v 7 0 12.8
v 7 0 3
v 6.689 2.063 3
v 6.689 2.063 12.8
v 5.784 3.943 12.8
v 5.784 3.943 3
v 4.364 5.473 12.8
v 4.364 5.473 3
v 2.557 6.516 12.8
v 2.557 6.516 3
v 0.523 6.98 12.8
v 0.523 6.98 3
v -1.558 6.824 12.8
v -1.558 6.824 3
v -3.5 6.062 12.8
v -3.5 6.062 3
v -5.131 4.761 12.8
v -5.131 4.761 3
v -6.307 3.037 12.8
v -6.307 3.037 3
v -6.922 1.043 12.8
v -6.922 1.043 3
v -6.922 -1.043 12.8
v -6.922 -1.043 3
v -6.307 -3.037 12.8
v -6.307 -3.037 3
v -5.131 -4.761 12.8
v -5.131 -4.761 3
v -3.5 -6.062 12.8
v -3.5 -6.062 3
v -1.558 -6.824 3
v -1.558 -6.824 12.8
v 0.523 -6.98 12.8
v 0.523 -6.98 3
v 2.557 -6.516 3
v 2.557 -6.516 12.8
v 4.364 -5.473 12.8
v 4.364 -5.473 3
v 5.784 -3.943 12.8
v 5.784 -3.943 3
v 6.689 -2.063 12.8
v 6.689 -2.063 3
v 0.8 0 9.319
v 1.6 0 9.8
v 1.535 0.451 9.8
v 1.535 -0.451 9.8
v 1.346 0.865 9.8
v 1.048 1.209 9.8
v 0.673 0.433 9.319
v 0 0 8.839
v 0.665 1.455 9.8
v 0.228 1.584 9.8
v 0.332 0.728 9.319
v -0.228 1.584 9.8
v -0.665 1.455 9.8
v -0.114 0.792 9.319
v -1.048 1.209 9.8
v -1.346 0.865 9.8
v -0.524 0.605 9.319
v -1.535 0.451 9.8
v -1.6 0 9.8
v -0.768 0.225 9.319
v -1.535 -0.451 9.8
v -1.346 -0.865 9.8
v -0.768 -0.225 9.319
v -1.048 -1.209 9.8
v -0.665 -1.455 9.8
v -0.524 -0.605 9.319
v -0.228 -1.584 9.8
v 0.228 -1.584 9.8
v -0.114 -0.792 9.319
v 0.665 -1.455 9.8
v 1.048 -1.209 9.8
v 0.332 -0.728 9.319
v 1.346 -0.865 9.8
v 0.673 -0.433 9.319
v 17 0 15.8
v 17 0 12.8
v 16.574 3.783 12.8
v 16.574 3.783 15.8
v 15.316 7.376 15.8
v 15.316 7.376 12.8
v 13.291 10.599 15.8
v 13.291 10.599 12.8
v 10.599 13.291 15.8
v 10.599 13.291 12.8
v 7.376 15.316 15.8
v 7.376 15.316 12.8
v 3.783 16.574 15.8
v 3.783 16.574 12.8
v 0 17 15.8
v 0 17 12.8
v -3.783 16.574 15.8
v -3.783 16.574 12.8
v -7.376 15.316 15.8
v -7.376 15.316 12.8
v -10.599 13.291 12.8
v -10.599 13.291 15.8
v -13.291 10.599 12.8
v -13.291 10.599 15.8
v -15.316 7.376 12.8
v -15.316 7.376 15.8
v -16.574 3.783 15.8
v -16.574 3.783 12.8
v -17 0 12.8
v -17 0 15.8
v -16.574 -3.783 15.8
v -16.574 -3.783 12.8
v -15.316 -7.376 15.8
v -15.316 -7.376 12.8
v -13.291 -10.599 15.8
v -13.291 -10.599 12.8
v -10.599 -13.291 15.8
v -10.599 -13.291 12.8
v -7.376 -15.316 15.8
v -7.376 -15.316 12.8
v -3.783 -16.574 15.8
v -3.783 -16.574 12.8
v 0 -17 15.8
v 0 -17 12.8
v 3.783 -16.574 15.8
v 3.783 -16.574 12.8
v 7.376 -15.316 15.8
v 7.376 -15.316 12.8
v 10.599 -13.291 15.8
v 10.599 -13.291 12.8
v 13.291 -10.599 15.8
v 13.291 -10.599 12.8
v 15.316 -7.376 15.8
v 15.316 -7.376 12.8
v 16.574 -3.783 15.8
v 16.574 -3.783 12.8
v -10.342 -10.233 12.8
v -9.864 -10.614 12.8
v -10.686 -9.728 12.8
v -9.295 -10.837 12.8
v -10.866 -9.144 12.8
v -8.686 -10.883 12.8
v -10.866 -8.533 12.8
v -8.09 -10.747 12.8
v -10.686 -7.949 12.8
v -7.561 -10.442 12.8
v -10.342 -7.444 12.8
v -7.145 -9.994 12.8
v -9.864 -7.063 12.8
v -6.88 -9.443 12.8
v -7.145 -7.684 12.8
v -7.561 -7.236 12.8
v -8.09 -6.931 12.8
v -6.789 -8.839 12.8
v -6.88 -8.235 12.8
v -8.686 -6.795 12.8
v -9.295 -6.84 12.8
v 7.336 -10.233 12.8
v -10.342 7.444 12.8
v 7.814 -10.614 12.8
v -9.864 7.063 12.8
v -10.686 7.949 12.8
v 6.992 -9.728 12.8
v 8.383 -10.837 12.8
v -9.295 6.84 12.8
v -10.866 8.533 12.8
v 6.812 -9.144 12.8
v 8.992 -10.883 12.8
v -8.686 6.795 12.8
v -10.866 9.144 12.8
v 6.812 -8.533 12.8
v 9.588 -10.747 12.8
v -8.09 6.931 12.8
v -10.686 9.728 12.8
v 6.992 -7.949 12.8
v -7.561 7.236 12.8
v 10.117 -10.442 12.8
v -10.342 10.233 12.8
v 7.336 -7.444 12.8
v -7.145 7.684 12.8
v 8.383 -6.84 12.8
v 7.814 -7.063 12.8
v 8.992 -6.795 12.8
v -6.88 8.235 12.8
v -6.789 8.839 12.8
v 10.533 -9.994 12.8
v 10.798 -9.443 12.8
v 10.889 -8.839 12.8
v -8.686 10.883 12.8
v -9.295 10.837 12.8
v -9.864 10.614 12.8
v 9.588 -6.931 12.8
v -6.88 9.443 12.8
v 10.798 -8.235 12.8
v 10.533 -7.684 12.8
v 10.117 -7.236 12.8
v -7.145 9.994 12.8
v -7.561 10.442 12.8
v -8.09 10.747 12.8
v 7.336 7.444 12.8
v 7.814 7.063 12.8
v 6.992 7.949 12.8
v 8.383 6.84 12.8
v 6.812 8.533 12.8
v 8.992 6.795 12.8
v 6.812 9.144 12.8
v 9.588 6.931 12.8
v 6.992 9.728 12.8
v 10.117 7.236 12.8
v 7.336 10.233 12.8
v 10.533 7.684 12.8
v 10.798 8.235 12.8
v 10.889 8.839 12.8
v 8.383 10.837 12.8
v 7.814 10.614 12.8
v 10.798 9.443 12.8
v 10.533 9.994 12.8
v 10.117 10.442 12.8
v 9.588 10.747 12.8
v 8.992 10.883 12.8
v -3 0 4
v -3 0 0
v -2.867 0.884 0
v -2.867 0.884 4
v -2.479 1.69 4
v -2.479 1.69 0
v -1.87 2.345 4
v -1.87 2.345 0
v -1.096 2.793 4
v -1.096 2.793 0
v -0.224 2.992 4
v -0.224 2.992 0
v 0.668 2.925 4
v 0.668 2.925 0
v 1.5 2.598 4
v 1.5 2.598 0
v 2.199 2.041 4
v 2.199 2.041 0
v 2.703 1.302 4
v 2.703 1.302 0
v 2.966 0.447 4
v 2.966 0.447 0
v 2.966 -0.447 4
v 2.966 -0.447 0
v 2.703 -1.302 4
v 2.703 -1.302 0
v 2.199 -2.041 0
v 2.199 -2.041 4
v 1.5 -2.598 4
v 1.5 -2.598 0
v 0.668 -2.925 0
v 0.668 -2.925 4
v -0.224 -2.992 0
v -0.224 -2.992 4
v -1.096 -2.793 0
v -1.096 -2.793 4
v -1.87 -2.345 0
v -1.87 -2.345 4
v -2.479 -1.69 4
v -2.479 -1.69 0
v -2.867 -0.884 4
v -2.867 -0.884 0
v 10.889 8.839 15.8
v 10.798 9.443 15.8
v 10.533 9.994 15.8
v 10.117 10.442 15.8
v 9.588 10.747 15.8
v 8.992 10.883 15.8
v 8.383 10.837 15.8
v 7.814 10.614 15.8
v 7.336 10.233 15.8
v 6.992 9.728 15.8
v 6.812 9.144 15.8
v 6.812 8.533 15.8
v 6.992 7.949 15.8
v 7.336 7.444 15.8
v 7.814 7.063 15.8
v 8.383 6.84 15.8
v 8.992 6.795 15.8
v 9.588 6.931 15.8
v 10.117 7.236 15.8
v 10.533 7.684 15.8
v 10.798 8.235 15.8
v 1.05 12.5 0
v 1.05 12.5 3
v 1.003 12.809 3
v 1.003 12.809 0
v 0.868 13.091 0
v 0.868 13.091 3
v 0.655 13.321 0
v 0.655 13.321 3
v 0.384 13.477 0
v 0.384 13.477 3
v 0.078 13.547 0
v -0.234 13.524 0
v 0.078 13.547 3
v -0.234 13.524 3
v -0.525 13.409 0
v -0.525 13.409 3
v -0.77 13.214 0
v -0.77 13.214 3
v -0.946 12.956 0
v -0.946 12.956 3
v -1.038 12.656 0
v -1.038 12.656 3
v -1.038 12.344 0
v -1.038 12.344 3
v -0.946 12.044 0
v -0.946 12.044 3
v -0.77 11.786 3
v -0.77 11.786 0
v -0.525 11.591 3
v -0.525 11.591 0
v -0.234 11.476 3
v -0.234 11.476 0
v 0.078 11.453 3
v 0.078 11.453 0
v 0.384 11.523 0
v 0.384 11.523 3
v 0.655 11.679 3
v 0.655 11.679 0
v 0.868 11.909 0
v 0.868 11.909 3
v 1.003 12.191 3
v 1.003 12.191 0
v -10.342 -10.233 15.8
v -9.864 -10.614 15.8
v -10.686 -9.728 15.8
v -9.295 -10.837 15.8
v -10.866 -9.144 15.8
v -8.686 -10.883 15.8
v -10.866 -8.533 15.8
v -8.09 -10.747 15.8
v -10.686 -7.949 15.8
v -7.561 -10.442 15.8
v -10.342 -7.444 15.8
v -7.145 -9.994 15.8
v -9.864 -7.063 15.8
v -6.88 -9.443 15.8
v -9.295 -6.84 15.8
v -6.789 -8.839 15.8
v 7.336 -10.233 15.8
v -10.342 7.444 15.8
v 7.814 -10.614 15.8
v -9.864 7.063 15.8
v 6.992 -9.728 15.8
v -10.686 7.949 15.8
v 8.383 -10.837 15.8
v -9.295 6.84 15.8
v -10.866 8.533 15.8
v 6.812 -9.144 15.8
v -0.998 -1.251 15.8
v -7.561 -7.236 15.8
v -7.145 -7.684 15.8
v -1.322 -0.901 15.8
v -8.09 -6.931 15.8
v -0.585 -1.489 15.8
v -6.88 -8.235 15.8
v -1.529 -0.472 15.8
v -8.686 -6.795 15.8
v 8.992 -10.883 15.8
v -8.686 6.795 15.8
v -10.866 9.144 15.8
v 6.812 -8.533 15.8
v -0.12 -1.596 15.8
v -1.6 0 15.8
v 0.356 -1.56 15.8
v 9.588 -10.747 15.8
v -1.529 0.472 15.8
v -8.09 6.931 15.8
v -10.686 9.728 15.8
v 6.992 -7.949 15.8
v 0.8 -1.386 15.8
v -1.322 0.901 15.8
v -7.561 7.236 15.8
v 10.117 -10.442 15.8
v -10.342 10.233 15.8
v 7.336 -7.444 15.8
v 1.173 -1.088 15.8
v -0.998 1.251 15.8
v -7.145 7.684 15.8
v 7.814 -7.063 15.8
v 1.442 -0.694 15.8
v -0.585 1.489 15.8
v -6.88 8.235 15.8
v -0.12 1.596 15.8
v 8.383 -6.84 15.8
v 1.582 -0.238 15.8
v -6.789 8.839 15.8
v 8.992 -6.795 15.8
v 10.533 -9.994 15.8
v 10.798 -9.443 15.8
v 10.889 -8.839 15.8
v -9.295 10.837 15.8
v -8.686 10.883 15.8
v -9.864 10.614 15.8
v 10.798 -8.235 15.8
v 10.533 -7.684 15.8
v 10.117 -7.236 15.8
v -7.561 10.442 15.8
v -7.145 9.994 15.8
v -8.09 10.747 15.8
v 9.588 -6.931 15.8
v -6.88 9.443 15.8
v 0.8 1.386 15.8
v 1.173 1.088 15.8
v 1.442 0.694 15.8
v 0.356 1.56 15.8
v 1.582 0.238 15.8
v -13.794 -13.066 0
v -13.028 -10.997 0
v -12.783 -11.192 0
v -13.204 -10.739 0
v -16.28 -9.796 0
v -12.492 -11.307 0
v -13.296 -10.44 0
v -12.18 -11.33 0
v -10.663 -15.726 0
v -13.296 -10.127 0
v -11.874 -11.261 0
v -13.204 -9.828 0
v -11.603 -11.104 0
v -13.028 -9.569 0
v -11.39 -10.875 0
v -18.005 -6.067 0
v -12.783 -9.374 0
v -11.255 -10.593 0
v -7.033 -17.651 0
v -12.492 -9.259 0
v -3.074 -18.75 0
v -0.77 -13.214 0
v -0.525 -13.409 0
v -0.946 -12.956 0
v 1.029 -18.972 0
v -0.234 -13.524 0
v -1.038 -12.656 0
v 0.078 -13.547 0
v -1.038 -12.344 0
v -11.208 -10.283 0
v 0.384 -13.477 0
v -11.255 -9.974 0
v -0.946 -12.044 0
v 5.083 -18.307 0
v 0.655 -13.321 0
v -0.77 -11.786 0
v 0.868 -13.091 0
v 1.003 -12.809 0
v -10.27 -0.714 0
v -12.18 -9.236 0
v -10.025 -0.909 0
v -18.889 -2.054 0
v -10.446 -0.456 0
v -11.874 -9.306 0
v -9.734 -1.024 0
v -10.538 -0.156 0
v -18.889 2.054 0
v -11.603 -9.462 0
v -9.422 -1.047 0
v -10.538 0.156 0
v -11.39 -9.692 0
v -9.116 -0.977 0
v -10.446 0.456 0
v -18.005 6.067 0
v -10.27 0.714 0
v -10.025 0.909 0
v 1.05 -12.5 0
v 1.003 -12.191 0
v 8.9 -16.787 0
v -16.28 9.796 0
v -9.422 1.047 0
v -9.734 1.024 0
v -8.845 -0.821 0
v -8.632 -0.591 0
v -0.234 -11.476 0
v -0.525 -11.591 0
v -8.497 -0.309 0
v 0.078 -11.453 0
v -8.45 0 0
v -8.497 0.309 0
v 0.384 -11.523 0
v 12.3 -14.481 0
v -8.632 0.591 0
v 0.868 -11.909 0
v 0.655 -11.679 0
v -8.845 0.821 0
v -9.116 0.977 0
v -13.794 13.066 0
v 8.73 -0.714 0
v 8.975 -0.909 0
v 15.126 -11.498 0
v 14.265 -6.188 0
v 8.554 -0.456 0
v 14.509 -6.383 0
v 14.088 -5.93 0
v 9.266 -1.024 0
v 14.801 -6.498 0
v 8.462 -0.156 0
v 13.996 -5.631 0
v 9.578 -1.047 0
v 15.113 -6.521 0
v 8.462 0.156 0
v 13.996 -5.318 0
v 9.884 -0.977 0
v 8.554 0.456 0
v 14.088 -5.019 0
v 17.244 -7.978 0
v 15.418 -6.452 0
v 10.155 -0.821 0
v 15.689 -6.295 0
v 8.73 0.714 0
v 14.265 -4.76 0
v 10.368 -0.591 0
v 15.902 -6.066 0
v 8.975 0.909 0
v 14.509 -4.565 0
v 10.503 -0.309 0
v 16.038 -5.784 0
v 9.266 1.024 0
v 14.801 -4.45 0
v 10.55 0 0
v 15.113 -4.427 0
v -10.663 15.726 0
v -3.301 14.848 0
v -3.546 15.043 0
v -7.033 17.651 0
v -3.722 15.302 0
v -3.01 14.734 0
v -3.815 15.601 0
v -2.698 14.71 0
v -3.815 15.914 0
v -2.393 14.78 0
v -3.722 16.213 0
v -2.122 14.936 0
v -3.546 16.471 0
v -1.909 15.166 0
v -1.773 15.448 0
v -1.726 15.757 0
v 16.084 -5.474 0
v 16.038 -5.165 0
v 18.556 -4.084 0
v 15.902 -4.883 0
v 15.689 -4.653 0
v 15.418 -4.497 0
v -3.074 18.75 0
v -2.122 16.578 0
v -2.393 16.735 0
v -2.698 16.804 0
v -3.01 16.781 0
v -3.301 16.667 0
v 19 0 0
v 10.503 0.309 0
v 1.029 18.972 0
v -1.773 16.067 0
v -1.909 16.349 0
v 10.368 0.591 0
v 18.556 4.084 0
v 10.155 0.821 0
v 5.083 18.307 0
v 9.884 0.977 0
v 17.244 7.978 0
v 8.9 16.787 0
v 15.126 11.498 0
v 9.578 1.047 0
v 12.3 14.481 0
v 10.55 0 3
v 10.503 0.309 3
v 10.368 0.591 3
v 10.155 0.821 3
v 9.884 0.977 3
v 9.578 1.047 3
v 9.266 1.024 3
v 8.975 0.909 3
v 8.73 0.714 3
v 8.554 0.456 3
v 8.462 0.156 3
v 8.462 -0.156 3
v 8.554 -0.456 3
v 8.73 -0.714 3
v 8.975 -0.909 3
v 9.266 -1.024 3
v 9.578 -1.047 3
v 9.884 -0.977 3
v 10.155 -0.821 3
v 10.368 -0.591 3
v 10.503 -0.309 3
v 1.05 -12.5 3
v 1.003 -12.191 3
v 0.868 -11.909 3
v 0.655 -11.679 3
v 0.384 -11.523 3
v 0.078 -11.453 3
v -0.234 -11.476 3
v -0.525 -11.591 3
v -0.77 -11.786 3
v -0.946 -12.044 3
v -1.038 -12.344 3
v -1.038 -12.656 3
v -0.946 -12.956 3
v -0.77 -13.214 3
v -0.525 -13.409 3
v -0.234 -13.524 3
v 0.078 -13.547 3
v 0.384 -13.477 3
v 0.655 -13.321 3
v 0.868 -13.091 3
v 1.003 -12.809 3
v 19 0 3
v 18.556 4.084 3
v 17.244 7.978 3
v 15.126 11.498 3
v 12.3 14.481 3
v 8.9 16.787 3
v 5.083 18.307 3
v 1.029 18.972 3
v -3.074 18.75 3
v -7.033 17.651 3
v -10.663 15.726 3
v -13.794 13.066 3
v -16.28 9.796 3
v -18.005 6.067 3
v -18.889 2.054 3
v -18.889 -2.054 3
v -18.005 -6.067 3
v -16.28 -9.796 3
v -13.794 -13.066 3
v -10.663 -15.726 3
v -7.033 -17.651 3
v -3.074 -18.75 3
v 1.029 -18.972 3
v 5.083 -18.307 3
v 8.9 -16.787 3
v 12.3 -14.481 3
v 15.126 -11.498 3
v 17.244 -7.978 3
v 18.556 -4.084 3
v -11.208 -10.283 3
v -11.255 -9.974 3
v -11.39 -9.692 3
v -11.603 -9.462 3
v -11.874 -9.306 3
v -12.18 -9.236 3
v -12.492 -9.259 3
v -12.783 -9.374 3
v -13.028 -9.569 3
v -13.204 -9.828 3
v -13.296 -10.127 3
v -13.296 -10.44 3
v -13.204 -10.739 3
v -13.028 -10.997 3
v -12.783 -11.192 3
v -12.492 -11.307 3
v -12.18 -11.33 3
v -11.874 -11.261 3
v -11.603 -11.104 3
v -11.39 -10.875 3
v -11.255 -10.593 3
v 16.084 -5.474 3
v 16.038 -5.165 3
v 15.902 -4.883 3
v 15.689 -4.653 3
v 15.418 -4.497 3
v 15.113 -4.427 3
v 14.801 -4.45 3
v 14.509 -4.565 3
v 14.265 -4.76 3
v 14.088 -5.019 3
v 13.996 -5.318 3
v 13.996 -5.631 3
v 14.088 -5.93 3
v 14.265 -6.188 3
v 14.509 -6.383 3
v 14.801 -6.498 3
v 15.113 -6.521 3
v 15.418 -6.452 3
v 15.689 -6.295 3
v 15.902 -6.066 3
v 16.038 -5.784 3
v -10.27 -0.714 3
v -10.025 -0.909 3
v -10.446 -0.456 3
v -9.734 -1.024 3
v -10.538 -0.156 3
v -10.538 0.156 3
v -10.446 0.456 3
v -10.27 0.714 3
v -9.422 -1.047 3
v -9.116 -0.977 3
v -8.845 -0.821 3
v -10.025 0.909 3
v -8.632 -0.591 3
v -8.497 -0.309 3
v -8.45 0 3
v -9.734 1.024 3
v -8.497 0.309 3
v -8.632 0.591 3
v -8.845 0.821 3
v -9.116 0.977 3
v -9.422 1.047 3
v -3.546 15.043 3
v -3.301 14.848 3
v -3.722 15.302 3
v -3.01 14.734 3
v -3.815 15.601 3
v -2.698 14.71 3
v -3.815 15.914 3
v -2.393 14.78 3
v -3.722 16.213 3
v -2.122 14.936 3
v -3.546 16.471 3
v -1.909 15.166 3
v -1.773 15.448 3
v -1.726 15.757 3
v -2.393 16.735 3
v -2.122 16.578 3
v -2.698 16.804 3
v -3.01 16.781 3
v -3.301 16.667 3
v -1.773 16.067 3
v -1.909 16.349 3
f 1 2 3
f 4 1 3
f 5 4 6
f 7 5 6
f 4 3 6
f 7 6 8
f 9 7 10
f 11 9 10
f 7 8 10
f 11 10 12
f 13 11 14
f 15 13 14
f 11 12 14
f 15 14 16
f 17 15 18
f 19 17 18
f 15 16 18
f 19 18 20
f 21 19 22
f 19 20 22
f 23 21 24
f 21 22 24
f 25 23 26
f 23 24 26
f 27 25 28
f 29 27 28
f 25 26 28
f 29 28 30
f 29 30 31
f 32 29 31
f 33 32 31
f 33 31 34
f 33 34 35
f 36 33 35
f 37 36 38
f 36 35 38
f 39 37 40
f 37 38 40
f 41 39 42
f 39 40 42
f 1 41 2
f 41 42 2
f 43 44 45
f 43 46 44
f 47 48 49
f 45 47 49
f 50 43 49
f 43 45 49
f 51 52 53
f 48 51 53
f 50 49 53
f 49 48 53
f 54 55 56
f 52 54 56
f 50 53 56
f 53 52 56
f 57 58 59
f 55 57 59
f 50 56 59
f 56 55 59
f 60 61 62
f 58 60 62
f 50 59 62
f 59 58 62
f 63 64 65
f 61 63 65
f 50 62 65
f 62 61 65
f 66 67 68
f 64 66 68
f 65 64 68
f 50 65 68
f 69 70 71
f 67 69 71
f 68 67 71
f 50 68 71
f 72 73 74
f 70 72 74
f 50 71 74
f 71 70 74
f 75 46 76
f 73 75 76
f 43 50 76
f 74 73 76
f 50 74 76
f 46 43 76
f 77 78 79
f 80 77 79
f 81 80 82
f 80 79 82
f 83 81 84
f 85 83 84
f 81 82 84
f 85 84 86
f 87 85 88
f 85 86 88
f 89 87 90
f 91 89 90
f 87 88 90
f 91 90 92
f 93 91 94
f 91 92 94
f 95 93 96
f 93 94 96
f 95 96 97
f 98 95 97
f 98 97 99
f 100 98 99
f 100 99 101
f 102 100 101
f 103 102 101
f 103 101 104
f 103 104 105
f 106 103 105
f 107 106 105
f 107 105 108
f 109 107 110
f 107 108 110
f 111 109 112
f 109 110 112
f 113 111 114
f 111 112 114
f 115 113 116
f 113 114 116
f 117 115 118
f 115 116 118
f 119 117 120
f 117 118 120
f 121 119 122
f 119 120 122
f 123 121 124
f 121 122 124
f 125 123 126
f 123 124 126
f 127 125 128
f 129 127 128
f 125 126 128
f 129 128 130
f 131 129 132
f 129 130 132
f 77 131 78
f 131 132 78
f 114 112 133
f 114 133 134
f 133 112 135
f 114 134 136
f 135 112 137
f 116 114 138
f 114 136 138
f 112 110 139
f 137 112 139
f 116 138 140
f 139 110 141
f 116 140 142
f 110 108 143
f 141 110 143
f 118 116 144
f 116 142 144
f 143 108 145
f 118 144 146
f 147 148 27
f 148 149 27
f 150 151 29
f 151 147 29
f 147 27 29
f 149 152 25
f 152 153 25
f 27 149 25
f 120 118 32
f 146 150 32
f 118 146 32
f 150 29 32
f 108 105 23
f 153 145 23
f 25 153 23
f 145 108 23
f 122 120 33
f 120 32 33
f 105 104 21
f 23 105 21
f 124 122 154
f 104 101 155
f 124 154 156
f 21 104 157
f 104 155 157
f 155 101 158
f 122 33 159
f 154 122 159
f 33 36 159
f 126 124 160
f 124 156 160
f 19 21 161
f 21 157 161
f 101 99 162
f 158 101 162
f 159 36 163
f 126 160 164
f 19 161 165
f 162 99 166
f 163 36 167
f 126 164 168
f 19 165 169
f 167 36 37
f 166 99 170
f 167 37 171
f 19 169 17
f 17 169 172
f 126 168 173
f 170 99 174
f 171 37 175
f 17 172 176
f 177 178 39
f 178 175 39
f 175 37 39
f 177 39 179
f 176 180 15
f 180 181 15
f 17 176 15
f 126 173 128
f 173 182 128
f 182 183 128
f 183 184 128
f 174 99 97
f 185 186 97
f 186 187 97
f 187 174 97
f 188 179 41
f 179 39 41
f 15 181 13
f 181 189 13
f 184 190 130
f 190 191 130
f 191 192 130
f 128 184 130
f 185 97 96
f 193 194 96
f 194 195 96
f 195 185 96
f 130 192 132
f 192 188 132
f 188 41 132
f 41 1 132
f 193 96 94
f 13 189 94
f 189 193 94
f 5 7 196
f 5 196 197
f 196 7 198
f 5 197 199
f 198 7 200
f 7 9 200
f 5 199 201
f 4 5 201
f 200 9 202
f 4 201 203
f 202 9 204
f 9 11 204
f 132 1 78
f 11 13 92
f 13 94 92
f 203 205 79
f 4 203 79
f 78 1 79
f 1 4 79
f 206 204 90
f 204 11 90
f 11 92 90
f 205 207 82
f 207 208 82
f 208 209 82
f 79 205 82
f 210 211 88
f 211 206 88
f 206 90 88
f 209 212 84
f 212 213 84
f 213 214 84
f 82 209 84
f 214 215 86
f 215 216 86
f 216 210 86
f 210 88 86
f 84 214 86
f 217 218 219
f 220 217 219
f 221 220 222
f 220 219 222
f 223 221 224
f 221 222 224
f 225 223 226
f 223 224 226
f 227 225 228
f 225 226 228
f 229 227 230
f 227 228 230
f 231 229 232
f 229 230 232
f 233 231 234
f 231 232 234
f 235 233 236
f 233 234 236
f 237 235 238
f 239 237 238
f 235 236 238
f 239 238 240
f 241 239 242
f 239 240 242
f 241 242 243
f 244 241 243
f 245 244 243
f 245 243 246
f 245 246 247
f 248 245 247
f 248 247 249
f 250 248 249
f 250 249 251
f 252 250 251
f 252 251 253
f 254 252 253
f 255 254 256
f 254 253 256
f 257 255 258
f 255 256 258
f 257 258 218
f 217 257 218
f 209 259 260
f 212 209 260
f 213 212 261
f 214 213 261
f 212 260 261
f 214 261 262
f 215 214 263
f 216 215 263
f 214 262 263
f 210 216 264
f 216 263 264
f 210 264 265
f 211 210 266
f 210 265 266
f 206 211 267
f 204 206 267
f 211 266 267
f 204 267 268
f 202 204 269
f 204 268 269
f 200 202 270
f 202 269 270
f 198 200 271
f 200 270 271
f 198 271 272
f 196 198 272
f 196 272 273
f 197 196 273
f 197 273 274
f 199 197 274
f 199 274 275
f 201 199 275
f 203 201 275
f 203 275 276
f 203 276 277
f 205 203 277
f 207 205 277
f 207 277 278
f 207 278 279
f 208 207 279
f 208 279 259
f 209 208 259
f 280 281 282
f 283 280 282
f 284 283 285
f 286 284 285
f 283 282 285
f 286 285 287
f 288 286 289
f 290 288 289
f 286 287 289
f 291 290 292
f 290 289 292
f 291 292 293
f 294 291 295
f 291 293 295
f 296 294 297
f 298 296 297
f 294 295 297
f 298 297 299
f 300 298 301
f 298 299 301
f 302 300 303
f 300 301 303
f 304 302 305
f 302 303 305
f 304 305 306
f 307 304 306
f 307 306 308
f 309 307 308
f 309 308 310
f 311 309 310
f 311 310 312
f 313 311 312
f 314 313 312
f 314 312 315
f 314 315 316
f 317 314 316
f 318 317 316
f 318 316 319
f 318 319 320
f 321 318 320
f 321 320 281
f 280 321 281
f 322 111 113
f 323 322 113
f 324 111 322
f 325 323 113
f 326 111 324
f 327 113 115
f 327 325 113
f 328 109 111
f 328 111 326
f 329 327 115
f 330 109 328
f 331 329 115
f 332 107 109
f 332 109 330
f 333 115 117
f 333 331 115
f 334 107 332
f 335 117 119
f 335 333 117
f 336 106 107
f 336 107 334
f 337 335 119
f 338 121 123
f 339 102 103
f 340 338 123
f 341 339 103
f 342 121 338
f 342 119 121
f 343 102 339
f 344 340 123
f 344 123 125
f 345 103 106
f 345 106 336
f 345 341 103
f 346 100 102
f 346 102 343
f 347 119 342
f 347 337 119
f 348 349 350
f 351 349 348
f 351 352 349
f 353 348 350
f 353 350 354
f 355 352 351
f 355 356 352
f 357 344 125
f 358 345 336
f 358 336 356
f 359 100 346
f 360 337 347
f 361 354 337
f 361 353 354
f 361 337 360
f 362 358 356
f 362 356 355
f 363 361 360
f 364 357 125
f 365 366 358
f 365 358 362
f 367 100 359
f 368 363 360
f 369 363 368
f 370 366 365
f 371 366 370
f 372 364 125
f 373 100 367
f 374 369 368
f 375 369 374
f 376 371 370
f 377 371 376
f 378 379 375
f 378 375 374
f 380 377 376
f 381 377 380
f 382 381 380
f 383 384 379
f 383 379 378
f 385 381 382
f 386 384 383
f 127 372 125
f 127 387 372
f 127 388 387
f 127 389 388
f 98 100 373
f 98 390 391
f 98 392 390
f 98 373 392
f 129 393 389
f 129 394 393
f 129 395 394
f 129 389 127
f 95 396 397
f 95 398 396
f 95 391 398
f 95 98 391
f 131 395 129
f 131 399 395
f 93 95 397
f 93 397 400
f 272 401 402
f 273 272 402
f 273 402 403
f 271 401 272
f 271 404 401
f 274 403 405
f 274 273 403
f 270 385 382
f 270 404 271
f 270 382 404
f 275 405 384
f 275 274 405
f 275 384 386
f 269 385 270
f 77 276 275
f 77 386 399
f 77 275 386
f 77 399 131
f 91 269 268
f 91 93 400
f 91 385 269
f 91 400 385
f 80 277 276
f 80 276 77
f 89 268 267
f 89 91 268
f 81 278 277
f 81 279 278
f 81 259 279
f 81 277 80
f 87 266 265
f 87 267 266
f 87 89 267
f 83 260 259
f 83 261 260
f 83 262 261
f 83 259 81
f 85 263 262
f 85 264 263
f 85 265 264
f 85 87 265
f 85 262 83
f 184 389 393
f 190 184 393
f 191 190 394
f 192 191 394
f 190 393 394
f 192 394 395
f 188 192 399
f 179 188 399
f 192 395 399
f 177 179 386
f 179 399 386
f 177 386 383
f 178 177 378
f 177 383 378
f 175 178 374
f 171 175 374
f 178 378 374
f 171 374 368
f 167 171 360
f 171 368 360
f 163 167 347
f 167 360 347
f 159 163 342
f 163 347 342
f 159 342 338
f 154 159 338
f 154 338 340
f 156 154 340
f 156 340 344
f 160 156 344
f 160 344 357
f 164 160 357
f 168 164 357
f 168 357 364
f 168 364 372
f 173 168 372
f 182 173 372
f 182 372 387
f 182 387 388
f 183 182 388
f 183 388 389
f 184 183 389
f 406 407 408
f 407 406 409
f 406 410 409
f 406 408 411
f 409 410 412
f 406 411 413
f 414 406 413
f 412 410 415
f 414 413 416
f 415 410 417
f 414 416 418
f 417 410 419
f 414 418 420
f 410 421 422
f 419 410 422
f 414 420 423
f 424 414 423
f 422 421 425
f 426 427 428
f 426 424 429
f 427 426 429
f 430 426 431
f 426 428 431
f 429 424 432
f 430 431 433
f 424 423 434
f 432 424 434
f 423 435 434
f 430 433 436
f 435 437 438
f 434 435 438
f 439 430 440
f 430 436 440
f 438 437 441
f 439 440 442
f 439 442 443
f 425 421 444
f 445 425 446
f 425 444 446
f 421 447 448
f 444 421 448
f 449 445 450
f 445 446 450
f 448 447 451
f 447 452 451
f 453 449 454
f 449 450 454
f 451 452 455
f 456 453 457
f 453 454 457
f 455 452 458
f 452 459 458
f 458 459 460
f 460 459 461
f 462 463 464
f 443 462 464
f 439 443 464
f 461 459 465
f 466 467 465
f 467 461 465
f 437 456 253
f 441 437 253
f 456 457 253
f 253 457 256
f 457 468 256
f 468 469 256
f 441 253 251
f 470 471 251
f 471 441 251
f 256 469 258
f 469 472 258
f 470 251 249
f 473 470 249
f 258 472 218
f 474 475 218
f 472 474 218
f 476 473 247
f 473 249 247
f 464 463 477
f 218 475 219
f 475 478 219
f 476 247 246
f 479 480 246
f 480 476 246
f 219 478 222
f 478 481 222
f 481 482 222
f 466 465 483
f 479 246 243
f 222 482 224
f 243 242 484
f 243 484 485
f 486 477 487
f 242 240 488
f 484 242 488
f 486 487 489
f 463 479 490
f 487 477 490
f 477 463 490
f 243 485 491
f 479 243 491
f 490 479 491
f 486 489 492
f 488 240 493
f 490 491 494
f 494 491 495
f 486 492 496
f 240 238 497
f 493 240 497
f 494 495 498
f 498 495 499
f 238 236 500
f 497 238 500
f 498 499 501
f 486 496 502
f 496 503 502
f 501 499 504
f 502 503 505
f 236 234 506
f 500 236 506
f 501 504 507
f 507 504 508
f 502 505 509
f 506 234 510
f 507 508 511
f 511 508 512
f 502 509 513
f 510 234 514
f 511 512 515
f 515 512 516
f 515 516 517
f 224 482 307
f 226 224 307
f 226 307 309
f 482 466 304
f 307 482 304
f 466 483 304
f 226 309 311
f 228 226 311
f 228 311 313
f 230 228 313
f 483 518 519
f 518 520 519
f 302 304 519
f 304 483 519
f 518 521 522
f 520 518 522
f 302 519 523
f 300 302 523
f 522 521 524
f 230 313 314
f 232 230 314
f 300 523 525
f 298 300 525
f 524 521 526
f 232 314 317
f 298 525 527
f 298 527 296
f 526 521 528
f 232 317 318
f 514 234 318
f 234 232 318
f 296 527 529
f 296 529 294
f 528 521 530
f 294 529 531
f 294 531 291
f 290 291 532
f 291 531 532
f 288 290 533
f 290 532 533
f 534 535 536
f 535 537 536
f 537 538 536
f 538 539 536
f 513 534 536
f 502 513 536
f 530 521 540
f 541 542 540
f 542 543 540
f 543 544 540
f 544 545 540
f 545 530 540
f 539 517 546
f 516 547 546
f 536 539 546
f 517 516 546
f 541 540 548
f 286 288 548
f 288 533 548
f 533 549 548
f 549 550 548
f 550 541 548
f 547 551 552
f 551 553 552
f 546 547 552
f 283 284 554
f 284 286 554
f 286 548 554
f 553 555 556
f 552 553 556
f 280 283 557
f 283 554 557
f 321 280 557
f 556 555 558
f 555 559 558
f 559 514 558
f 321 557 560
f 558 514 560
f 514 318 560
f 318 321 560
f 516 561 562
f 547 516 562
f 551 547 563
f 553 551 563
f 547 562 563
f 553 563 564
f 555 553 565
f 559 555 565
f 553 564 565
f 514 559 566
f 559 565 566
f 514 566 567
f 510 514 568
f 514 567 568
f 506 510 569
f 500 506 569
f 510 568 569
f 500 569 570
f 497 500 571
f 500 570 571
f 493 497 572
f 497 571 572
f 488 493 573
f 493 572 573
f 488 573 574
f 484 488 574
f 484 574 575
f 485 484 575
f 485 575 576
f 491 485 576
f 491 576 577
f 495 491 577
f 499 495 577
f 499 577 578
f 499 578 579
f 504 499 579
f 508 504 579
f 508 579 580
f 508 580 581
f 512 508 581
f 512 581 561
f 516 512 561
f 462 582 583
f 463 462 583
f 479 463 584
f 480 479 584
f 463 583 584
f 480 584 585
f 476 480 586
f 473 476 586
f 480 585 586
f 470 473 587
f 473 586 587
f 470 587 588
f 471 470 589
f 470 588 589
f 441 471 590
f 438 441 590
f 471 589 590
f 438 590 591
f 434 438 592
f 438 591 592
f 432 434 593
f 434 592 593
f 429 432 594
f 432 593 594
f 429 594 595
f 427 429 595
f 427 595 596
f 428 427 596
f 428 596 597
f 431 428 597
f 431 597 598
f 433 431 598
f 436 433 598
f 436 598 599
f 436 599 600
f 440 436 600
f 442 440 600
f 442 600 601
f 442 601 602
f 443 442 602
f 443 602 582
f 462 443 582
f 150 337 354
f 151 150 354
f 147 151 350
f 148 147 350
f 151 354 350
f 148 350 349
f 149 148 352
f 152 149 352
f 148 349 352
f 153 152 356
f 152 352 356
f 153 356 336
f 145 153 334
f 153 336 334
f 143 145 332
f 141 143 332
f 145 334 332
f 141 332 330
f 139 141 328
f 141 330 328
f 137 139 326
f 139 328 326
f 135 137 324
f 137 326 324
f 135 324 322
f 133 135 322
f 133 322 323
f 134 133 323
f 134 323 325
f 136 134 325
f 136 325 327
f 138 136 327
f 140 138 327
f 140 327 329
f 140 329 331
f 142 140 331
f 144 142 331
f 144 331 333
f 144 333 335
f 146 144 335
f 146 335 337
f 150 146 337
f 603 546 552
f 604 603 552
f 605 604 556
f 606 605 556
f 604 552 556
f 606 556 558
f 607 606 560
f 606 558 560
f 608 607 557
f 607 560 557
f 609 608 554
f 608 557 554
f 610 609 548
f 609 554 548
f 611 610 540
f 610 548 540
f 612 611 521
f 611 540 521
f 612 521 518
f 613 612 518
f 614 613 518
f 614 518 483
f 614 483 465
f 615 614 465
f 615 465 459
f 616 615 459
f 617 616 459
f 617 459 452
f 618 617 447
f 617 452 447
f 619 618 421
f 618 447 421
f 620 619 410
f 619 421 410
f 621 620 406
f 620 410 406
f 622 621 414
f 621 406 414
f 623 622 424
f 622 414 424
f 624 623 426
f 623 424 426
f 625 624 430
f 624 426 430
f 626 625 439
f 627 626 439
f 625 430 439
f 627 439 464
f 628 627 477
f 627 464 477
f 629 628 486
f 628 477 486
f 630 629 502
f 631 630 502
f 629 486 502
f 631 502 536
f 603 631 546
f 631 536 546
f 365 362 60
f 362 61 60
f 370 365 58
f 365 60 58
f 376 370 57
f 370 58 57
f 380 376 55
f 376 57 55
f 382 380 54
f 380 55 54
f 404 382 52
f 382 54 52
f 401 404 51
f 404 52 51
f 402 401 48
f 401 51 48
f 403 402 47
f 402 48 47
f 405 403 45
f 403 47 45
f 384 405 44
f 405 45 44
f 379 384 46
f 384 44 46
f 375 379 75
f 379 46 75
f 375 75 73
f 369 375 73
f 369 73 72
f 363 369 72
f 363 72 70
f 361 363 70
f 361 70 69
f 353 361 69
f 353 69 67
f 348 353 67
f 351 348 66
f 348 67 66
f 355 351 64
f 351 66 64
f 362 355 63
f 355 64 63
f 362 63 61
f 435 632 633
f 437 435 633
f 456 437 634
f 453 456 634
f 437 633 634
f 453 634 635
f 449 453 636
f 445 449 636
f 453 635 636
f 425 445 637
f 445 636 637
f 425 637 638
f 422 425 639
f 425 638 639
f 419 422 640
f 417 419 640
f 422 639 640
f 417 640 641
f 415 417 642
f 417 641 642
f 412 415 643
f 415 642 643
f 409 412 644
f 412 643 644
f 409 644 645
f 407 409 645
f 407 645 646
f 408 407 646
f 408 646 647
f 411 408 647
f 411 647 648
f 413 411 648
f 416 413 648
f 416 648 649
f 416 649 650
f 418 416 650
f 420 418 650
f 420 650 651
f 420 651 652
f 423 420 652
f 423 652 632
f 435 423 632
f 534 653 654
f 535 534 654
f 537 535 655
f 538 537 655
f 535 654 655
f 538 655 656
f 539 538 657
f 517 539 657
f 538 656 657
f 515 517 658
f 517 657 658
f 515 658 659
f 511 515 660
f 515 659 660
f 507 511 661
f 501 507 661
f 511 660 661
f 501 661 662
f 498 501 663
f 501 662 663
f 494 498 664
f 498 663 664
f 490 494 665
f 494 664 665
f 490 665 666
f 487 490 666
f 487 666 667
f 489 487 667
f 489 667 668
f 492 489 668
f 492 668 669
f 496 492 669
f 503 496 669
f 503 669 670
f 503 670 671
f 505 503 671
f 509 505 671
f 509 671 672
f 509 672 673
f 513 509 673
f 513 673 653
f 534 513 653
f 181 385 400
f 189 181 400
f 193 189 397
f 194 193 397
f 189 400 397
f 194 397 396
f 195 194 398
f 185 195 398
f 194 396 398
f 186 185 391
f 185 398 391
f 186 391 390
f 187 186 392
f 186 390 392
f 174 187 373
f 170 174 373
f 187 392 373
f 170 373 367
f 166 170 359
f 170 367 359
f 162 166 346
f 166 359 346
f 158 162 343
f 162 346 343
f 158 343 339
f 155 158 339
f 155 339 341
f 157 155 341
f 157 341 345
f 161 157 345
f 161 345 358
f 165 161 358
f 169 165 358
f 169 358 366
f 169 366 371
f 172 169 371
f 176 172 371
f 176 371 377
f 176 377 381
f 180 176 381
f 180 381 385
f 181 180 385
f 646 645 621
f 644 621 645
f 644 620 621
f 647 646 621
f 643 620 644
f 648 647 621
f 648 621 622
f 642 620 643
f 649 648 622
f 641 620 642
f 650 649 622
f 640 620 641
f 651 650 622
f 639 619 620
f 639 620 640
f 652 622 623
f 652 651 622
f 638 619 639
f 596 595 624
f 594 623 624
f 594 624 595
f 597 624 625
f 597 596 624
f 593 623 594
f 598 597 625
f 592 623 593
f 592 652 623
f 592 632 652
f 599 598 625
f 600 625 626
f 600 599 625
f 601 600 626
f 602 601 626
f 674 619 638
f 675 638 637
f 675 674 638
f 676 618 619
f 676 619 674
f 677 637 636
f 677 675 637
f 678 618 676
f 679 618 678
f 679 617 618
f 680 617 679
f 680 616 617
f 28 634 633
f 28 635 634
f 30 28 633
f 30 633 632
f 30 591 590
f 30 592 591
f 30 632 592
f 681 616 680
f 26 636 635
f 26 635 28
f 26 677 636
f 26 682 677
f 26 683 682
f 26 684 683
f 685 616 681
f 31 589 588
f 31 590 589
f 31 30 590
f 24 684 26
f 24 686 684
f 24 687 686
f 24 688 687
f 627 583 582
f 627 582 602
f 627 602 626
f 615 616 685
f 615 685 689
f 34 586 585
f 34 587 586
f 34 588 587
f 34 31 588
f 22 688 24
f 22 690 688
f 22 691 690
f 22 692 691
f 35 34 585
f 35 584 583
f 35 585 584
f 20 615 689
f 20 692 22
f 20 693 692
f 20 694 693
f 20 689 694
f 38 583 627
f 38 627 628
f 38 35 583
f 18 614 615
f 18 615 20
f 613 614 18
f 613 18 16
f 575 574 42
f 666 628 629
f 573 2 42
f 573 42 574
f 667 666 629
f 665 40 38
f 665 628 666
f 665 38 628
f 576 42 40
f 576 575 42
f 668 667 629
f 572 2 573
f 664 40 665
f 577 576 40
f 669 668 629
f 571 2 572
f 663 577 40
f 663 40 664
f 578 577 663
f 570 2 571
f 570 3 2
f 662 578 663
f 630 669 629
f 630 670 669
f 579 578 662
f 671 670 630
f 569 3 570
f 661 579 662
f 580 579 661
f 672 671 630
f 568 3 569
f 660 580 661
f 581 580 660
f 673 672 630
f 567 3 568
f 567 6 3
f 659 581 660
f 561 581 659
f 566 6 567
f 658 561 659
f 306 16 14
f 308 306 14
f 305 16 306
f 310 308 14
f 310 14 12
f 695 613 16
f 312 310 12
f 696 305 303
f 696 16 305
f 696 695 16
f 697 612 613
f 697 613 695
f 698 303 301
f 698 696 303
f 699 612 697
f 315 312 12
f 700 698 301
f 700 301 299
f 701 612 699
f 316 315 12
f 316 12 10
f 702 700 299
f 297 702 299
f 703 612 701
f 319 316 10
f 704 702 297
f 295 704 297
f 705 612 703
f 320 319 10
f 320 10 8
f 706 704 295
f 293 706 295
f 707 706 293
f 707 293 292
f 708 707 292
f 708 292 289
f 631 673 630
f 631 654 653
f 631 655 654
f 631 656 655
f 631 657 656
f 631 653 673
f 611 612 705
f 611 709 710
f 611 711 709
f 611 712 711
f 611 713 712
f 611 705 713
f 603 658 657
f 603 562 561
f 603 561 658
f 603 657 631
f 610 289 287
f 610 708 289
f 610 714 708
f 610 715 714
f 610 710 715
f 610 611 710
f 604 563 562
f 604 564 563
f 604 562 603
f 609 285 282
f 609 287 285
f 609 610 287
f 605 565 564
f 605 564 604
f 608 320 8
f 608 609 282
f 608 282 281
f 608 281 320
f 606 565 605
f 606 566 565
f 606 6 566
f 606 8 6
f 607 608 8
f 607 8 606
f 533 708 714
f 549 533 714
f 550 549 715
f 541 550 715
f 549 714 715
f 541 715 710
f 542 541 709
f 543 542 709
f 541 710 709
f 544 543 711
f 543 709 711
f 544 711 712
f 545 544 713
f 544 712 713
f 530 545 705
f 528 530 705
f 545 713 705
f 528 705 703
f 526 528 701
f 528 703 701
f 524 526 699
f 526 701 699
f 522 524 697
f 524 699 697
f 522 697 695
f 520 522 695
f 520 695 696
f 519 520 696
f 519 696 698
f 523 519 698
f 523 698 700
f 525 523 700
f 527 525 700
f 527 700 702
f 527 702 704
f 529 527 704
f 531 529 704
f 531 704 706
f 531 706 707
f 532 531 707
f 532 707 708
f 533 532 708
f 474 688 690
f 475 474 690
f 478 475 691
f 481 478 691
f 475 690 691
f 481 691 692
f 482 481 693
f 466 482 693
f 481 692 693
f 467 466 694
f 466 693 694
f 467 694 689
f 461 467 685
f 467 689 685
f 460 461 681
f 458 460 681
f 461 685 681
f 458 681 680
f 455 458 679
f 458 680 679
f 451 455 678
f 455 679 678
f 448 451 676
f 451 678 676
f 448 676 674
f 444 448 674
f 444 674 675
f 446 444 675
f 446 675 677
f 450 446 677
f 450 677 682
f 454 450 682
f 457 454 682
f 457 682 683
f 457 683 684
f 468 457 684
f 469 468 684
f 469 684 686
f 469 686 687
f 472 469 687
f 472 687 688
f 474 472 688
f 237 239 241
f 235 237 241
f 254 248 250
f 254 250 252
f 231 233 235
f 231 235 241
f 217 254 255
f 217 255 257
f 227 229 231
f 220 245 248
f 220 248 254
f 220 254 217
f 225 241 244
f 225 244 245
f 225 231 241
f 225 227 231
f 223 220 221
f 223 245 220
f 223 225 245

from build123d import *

# Parameters (mm, degrees)
SKETCH_1_R                  = 19
EXTRUDE_1_DEPTH             = 3
SKETCH_2_R                  = 1.05
CUT_EXTRUDE_1_DEPTH         = 28.037011669
SKETCH_3_R                  = 7
EXTRUDE_2_DEPTH             = 9.8
SKETCH_4_R                  = 17
EXTRUDE_3_DEPTH             = 3
HOLE_WIZARD_3_2_3_2_1_D     = 3.2
HOLE_WIZARD_3_2_3_2_1_DEPTH = 6
HOLE_WIZARD_3_2_3_2_1_TIP   = 0.96137699
SKETCH_7_R                  = 3
CUT_EXTRUDE_2_DEPTH         = 4
SKETCH_8_R                  = 2.05
CUT_EXTRUDE_3_DEPTH         = 4


with BuildPart() as part:
    # 草图1 → 凸台-拉伸1 (new body)
    with BuildSketch(Plane.XY):
        Circle(SKETCH_1_R)
    extrude(amount=EXTRUDE_1_DEPTH)

    # 草图2 → 切除-拉伸1 (cut, through all)
    with BuildSketch(Plane.XY.offset(3)):
        with Locations((0, 12.5)):
            Circle(SKETCH_2_R)
        with Locations((-9.5, 0)):
            Circle(SKETCH_2_R)
        with Locations((9.5, 0)):
            Circle(SKETCH_2_R)
        with Locations((0, -12.5)):
            Circle(SKETCH_2_R)
        with Locations((-2.77644219, 15.757264)):
            Circle(SKETCH_2_R)
        with Locations((15.034412013, -5.474162531)):
            Circle(SKETCH_2_R)
        with Locations((-12.257969823, -10.283101469)):
            Circle(SKETCH_2_R)
    extrude(amount=-CUT_EXTRUDE_1_DEPTH, mode=Mode.SUBTRACT)

    # 草图3 → 凸台-拉伸2 (add)
    with BuildSketch(Plane.XY.offset(3)):
        Circle(SKETCH_3_R)
    extrude(amount=EXTRUDE_2_DEPTH)

    # 草图4 → 凸台-拉伸3 (add)
    with BuildSketch(Plane.XY.offset(12.8)):
        Circle(SKETCH_4_R)
    extrude(amount=EXTRUDE_3_DEPTH)

    # Ø3.2 (3.2) 直径孔1
    with Locations(Plane.XY.offset(15.8)):
        with Locations((0, 0)):
            Hole(HOLE_WIZARD_3_2_3_2_1_D / 2, depth=HOLE_WIZARD_3_2_3_2_1_DEPTH)
            with Locations((0, 0, -(HOLE_WIZARD_3_2_3_2_1_DEPTH + HOLE_WIZARD_3_2_3_2_1_TIP / 2))):  # 118° drill point
                Cone(0, HOLE_WIZARD_3_2_3_2_1_D / 2, HOLE_WIZARD_3_2_3_2_1_TIP, mode=Mode.SUBTRACT)

    # 草图7 → 切除-拉伸2 (cut)
    with BuildSketch(Plane(origin=(0, 0, 0), x_dir=(-1, 0, 0), z_dir=(0, 0, -1))):
        Circle(SKETCH_7_R)
    extrude(amount=-CUT_EXTRUDE_2_DEPTH, mode=Mode.SUBTRACT)

    # 草图8 → 切除-拉伸3 (cut)
    with BuildSketch(Plane.XY.offset(15.8)):
        with Locations((8.838834765, 8.838834765)):
            Circle(SKETCH_8_R)
        with Locations((8.838834765, -8.838834765)):
            Circle(SKETCH_8_R)
        with Locations((-8.838834765, -8.838834765)):
            Circle(SKETCH_8_R)
        with Locations((-8.838834765, 8.838834765)):
            Circle(SKETCH_8_R)
    extrude(amount=-CUT_EXTRUDE_3_DEPTH, mode=Mode.SUBTRACT)


solid = part.part
